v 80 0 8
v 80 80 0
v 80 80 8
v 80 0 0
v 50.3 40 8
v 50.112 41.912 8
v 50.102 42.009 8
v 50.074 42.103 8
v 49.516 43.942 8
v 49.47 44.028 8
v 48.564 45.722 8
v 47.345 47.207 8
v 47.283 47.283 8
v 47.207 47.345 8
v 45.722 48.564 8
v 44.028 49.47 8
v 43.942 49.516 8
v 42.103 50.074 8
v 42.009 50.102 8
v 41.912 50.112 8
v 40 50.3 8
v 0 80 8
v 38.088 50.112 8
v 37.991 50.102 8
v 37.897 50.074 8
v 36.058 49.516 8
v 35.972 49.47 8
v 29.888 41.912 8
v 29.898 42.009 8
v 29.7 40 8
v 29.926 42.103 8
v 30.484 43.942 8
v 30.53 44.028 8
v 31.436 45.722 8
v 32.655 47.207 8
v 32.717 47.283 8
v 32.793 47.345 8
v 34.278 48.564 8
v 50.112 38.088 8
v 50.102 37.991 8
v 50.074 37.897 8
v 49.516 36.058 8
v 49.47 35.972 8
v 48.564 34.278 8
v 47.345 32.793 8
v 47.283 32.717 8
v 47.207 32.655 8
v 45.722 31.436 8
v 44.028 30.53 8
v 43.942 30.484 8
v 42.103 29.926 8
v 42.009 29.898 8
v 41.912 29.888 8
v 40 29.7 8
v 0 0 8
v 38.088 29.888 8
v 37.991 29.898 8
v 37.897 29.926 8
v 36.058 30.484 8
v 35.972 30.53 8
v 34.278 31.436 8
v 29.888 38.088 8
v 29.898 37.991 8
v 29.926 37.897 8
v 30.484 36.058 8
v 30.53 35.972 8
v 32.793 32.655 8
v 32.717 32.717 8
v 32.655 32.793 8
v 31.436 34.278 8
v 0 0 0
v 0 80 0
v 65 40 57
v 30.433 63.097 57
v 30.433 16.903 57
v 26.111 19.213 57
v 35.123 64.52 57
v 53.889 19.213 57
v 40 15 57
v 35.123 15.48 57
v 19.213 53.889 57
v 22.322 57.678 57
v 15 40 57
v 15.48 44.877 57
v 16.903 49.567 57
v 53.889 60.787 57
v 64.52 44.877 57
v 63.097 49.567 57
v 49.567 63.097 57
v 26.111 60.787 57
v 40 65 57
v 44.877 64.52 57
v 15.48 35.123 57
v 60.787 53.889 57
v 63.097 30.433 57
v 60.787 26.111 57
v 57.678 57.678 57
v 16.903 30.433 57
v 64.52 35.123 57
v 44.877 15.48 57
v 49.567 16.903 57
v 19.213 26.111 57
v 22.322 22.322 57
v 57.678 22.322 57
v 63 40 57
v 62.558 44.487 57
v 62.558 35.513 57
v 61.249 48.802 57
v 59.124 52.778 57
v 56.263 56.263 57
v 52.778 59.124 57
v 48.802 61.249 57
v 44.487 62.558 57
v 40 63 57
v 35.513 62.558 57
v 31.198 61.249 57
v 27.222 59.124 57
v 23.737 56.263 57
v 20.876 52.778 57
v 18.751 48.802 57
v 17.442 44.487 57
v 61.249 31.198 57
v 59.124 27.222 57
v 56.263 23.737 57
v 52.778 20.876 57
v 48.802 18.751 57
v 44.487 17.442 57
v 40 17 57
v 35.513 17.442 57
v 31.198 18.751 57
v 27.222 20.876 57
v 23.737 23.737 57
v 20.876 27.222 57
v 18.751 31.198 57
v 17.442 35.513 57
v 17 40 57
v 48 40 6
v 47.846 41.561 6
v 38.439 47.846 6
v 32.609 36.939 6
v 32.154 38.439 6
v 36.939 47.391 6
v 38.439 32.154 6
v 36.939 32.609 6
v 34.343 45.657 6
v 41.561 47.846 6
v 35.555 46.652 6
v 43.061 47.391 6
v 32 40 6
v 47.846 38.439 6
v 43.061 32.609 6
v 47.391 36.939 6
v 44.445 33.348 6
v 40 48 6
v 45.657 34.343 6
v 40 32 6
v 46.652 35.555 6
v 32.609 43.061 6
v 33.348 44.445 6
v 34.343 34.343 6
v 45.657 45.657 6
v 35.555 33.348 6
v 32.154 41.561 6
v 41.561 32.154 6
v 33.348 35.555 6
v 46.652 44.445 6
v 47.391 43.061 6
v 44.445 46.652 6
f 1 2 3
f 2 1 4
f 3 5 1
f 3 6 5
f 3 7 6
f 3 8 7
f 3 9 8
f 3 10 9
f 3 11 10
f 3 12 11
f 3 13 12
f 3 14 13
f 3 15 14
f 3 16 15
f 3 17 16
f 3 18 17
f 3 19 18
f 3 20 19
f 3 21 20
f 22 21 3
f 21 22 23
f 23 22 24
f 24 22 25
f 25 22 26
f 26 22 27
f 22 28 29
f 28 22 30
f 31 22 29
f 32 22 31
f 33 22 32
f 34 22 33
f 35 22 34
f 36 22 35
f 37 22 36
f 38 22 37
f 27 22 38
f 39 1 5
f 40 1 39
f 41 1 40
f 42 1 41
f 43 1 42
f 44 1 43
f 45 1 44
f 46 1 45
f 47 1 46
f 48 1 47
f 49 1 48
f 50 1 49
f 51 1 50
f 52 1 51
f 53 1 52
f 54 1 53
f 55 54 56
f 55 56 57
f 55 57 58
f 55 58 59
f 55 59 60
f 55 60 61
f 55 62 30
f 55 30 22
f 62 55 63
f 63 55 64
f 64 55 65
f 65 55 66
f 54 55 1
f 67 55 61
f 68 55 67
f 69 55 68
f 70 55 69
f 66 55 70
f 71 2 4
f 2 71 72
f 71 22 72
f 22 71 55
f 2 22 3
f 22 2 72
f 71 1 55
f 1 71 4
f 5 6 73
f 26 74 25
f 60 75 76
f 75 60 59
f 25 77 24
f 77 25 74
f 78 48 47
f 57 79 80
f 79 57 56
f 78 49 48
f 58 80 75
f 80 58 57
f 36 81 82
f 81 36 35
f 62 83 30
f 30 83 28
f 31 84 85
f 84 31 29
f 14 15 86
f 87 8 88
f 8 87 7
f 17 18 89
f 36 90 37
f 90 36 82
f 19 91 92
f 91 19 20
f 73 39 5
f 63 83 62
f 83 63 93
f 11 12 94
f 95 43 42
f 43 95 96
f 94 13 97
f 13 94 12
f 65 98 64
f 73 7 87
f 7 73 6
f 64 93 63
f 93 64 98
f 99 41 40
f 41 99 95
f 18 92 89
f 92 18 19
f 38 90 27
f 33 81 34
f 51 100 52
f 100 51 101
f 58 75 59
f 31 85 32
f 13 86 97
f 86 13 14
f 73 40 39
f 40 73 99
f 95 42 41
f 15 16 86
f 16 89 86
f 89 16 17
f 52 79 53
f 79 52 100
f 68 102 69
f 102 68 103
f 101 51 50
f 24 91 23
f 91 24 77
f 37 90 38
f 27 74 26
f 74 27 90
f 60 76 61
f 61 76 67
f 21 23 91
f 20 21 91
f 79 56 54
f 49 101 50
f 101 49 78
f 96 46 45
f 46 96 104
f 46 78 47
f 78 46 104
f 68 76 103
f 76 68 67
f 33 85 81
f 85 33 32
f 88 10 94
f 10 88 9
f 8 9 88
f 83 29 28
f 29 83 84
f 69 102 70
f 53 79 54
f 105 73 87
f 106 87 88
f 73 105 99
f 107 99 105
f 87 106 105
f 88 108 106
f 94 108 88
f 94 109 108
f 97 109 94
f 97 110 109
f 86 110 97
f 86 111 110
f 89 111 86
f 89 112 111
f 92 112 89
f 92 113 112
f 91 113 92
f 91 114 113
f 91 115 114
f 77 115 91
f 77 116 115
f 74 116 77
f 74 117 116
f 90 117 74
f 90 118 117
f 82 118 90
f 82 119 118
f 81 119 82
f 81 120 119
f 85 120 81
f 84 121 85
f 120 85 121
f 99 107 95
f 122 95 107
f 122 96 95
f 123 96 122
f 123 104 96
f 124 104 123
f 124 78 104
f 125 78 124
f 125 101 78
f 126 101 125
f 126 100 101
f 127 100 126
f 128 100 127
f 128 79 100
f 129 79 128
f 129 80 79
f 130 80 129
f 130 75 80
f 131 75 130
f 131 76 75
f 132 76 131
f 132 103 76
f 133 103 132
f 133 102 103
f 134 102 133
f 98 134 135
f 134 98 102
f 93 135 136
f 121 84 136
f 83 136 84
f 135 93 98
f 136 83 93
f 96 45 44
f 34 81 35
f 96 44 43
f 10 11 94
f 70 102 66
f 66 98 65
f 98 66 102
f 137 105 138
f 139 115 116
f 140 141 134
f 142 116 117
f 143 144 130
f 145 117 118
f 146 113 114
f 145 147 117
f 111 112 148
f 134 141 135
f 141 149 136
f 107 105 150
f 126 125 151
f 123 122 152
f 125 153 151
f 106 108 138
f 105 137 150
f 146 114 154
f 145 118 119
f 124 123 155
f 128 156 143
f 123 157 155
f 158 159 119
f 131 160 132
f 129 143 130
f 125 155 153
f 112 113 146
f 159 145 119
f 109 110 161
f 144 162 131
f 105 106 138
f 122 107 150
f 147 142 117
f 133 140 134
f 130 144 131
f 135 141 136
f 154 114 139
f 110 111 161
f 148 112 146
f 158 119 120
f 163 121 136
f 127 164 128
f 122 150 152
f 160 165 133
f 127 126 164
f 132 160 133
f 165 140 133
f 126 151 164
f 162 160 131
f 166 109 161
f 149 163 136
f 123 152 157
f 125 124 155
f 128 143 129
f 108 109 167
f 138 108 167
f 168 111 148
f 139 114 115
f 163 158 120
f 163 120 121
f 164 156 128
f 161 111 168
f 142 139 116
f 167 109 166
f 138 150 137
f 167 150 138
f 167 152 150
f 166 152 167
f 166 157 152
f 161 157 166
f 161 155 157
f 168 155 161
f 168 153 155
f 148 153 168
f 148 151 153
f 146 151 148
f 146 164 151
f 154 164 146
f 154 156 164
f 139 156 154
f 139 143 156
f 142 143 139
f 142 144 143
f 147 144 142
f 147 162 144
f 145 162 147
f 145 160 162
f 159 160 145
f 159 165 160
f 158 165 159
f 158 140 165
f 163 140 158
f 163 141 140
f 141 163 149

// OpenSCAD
$fn = 32;

// ----------------------------------------------------------------------
// Hopper: funnel with square flange
// ----------------------------------------------------------------------

// --- parameters (mm) ---
fl = 80;                  // flange side, X and Y
fl_t = 8;                 // flange thickness
cone_h = 50;              // cone height above the flange
top_d = 50;               // cone mouth diameter
bot_d = 20;               // cone spout diameter
wall = 2;                 // cone wall thickness
fit_tol = 0.05;           // tolerance for press fits, mm
free_tol = 0.3;           // tolerance for clearance fits, mm

bore_d = bot_d - 2 * wall;  // spout bore diameter
total_h = fl_t + cone_h - 1;  // overall height

difference() {
  union() {
    cube([fl, fl, fl_t]);
    translate([fl / 2, fl / 2, fl_t - 1])
      cylinder(h = cone_h, d1 = bot_d, d2 = top_d);
  }
  translate([fl / 2, fl / 2, fl_t - 2])
    cylinder(h = cone_h + 1, d1 = bore_d, d2 = top_d - 2 * wall);
}
